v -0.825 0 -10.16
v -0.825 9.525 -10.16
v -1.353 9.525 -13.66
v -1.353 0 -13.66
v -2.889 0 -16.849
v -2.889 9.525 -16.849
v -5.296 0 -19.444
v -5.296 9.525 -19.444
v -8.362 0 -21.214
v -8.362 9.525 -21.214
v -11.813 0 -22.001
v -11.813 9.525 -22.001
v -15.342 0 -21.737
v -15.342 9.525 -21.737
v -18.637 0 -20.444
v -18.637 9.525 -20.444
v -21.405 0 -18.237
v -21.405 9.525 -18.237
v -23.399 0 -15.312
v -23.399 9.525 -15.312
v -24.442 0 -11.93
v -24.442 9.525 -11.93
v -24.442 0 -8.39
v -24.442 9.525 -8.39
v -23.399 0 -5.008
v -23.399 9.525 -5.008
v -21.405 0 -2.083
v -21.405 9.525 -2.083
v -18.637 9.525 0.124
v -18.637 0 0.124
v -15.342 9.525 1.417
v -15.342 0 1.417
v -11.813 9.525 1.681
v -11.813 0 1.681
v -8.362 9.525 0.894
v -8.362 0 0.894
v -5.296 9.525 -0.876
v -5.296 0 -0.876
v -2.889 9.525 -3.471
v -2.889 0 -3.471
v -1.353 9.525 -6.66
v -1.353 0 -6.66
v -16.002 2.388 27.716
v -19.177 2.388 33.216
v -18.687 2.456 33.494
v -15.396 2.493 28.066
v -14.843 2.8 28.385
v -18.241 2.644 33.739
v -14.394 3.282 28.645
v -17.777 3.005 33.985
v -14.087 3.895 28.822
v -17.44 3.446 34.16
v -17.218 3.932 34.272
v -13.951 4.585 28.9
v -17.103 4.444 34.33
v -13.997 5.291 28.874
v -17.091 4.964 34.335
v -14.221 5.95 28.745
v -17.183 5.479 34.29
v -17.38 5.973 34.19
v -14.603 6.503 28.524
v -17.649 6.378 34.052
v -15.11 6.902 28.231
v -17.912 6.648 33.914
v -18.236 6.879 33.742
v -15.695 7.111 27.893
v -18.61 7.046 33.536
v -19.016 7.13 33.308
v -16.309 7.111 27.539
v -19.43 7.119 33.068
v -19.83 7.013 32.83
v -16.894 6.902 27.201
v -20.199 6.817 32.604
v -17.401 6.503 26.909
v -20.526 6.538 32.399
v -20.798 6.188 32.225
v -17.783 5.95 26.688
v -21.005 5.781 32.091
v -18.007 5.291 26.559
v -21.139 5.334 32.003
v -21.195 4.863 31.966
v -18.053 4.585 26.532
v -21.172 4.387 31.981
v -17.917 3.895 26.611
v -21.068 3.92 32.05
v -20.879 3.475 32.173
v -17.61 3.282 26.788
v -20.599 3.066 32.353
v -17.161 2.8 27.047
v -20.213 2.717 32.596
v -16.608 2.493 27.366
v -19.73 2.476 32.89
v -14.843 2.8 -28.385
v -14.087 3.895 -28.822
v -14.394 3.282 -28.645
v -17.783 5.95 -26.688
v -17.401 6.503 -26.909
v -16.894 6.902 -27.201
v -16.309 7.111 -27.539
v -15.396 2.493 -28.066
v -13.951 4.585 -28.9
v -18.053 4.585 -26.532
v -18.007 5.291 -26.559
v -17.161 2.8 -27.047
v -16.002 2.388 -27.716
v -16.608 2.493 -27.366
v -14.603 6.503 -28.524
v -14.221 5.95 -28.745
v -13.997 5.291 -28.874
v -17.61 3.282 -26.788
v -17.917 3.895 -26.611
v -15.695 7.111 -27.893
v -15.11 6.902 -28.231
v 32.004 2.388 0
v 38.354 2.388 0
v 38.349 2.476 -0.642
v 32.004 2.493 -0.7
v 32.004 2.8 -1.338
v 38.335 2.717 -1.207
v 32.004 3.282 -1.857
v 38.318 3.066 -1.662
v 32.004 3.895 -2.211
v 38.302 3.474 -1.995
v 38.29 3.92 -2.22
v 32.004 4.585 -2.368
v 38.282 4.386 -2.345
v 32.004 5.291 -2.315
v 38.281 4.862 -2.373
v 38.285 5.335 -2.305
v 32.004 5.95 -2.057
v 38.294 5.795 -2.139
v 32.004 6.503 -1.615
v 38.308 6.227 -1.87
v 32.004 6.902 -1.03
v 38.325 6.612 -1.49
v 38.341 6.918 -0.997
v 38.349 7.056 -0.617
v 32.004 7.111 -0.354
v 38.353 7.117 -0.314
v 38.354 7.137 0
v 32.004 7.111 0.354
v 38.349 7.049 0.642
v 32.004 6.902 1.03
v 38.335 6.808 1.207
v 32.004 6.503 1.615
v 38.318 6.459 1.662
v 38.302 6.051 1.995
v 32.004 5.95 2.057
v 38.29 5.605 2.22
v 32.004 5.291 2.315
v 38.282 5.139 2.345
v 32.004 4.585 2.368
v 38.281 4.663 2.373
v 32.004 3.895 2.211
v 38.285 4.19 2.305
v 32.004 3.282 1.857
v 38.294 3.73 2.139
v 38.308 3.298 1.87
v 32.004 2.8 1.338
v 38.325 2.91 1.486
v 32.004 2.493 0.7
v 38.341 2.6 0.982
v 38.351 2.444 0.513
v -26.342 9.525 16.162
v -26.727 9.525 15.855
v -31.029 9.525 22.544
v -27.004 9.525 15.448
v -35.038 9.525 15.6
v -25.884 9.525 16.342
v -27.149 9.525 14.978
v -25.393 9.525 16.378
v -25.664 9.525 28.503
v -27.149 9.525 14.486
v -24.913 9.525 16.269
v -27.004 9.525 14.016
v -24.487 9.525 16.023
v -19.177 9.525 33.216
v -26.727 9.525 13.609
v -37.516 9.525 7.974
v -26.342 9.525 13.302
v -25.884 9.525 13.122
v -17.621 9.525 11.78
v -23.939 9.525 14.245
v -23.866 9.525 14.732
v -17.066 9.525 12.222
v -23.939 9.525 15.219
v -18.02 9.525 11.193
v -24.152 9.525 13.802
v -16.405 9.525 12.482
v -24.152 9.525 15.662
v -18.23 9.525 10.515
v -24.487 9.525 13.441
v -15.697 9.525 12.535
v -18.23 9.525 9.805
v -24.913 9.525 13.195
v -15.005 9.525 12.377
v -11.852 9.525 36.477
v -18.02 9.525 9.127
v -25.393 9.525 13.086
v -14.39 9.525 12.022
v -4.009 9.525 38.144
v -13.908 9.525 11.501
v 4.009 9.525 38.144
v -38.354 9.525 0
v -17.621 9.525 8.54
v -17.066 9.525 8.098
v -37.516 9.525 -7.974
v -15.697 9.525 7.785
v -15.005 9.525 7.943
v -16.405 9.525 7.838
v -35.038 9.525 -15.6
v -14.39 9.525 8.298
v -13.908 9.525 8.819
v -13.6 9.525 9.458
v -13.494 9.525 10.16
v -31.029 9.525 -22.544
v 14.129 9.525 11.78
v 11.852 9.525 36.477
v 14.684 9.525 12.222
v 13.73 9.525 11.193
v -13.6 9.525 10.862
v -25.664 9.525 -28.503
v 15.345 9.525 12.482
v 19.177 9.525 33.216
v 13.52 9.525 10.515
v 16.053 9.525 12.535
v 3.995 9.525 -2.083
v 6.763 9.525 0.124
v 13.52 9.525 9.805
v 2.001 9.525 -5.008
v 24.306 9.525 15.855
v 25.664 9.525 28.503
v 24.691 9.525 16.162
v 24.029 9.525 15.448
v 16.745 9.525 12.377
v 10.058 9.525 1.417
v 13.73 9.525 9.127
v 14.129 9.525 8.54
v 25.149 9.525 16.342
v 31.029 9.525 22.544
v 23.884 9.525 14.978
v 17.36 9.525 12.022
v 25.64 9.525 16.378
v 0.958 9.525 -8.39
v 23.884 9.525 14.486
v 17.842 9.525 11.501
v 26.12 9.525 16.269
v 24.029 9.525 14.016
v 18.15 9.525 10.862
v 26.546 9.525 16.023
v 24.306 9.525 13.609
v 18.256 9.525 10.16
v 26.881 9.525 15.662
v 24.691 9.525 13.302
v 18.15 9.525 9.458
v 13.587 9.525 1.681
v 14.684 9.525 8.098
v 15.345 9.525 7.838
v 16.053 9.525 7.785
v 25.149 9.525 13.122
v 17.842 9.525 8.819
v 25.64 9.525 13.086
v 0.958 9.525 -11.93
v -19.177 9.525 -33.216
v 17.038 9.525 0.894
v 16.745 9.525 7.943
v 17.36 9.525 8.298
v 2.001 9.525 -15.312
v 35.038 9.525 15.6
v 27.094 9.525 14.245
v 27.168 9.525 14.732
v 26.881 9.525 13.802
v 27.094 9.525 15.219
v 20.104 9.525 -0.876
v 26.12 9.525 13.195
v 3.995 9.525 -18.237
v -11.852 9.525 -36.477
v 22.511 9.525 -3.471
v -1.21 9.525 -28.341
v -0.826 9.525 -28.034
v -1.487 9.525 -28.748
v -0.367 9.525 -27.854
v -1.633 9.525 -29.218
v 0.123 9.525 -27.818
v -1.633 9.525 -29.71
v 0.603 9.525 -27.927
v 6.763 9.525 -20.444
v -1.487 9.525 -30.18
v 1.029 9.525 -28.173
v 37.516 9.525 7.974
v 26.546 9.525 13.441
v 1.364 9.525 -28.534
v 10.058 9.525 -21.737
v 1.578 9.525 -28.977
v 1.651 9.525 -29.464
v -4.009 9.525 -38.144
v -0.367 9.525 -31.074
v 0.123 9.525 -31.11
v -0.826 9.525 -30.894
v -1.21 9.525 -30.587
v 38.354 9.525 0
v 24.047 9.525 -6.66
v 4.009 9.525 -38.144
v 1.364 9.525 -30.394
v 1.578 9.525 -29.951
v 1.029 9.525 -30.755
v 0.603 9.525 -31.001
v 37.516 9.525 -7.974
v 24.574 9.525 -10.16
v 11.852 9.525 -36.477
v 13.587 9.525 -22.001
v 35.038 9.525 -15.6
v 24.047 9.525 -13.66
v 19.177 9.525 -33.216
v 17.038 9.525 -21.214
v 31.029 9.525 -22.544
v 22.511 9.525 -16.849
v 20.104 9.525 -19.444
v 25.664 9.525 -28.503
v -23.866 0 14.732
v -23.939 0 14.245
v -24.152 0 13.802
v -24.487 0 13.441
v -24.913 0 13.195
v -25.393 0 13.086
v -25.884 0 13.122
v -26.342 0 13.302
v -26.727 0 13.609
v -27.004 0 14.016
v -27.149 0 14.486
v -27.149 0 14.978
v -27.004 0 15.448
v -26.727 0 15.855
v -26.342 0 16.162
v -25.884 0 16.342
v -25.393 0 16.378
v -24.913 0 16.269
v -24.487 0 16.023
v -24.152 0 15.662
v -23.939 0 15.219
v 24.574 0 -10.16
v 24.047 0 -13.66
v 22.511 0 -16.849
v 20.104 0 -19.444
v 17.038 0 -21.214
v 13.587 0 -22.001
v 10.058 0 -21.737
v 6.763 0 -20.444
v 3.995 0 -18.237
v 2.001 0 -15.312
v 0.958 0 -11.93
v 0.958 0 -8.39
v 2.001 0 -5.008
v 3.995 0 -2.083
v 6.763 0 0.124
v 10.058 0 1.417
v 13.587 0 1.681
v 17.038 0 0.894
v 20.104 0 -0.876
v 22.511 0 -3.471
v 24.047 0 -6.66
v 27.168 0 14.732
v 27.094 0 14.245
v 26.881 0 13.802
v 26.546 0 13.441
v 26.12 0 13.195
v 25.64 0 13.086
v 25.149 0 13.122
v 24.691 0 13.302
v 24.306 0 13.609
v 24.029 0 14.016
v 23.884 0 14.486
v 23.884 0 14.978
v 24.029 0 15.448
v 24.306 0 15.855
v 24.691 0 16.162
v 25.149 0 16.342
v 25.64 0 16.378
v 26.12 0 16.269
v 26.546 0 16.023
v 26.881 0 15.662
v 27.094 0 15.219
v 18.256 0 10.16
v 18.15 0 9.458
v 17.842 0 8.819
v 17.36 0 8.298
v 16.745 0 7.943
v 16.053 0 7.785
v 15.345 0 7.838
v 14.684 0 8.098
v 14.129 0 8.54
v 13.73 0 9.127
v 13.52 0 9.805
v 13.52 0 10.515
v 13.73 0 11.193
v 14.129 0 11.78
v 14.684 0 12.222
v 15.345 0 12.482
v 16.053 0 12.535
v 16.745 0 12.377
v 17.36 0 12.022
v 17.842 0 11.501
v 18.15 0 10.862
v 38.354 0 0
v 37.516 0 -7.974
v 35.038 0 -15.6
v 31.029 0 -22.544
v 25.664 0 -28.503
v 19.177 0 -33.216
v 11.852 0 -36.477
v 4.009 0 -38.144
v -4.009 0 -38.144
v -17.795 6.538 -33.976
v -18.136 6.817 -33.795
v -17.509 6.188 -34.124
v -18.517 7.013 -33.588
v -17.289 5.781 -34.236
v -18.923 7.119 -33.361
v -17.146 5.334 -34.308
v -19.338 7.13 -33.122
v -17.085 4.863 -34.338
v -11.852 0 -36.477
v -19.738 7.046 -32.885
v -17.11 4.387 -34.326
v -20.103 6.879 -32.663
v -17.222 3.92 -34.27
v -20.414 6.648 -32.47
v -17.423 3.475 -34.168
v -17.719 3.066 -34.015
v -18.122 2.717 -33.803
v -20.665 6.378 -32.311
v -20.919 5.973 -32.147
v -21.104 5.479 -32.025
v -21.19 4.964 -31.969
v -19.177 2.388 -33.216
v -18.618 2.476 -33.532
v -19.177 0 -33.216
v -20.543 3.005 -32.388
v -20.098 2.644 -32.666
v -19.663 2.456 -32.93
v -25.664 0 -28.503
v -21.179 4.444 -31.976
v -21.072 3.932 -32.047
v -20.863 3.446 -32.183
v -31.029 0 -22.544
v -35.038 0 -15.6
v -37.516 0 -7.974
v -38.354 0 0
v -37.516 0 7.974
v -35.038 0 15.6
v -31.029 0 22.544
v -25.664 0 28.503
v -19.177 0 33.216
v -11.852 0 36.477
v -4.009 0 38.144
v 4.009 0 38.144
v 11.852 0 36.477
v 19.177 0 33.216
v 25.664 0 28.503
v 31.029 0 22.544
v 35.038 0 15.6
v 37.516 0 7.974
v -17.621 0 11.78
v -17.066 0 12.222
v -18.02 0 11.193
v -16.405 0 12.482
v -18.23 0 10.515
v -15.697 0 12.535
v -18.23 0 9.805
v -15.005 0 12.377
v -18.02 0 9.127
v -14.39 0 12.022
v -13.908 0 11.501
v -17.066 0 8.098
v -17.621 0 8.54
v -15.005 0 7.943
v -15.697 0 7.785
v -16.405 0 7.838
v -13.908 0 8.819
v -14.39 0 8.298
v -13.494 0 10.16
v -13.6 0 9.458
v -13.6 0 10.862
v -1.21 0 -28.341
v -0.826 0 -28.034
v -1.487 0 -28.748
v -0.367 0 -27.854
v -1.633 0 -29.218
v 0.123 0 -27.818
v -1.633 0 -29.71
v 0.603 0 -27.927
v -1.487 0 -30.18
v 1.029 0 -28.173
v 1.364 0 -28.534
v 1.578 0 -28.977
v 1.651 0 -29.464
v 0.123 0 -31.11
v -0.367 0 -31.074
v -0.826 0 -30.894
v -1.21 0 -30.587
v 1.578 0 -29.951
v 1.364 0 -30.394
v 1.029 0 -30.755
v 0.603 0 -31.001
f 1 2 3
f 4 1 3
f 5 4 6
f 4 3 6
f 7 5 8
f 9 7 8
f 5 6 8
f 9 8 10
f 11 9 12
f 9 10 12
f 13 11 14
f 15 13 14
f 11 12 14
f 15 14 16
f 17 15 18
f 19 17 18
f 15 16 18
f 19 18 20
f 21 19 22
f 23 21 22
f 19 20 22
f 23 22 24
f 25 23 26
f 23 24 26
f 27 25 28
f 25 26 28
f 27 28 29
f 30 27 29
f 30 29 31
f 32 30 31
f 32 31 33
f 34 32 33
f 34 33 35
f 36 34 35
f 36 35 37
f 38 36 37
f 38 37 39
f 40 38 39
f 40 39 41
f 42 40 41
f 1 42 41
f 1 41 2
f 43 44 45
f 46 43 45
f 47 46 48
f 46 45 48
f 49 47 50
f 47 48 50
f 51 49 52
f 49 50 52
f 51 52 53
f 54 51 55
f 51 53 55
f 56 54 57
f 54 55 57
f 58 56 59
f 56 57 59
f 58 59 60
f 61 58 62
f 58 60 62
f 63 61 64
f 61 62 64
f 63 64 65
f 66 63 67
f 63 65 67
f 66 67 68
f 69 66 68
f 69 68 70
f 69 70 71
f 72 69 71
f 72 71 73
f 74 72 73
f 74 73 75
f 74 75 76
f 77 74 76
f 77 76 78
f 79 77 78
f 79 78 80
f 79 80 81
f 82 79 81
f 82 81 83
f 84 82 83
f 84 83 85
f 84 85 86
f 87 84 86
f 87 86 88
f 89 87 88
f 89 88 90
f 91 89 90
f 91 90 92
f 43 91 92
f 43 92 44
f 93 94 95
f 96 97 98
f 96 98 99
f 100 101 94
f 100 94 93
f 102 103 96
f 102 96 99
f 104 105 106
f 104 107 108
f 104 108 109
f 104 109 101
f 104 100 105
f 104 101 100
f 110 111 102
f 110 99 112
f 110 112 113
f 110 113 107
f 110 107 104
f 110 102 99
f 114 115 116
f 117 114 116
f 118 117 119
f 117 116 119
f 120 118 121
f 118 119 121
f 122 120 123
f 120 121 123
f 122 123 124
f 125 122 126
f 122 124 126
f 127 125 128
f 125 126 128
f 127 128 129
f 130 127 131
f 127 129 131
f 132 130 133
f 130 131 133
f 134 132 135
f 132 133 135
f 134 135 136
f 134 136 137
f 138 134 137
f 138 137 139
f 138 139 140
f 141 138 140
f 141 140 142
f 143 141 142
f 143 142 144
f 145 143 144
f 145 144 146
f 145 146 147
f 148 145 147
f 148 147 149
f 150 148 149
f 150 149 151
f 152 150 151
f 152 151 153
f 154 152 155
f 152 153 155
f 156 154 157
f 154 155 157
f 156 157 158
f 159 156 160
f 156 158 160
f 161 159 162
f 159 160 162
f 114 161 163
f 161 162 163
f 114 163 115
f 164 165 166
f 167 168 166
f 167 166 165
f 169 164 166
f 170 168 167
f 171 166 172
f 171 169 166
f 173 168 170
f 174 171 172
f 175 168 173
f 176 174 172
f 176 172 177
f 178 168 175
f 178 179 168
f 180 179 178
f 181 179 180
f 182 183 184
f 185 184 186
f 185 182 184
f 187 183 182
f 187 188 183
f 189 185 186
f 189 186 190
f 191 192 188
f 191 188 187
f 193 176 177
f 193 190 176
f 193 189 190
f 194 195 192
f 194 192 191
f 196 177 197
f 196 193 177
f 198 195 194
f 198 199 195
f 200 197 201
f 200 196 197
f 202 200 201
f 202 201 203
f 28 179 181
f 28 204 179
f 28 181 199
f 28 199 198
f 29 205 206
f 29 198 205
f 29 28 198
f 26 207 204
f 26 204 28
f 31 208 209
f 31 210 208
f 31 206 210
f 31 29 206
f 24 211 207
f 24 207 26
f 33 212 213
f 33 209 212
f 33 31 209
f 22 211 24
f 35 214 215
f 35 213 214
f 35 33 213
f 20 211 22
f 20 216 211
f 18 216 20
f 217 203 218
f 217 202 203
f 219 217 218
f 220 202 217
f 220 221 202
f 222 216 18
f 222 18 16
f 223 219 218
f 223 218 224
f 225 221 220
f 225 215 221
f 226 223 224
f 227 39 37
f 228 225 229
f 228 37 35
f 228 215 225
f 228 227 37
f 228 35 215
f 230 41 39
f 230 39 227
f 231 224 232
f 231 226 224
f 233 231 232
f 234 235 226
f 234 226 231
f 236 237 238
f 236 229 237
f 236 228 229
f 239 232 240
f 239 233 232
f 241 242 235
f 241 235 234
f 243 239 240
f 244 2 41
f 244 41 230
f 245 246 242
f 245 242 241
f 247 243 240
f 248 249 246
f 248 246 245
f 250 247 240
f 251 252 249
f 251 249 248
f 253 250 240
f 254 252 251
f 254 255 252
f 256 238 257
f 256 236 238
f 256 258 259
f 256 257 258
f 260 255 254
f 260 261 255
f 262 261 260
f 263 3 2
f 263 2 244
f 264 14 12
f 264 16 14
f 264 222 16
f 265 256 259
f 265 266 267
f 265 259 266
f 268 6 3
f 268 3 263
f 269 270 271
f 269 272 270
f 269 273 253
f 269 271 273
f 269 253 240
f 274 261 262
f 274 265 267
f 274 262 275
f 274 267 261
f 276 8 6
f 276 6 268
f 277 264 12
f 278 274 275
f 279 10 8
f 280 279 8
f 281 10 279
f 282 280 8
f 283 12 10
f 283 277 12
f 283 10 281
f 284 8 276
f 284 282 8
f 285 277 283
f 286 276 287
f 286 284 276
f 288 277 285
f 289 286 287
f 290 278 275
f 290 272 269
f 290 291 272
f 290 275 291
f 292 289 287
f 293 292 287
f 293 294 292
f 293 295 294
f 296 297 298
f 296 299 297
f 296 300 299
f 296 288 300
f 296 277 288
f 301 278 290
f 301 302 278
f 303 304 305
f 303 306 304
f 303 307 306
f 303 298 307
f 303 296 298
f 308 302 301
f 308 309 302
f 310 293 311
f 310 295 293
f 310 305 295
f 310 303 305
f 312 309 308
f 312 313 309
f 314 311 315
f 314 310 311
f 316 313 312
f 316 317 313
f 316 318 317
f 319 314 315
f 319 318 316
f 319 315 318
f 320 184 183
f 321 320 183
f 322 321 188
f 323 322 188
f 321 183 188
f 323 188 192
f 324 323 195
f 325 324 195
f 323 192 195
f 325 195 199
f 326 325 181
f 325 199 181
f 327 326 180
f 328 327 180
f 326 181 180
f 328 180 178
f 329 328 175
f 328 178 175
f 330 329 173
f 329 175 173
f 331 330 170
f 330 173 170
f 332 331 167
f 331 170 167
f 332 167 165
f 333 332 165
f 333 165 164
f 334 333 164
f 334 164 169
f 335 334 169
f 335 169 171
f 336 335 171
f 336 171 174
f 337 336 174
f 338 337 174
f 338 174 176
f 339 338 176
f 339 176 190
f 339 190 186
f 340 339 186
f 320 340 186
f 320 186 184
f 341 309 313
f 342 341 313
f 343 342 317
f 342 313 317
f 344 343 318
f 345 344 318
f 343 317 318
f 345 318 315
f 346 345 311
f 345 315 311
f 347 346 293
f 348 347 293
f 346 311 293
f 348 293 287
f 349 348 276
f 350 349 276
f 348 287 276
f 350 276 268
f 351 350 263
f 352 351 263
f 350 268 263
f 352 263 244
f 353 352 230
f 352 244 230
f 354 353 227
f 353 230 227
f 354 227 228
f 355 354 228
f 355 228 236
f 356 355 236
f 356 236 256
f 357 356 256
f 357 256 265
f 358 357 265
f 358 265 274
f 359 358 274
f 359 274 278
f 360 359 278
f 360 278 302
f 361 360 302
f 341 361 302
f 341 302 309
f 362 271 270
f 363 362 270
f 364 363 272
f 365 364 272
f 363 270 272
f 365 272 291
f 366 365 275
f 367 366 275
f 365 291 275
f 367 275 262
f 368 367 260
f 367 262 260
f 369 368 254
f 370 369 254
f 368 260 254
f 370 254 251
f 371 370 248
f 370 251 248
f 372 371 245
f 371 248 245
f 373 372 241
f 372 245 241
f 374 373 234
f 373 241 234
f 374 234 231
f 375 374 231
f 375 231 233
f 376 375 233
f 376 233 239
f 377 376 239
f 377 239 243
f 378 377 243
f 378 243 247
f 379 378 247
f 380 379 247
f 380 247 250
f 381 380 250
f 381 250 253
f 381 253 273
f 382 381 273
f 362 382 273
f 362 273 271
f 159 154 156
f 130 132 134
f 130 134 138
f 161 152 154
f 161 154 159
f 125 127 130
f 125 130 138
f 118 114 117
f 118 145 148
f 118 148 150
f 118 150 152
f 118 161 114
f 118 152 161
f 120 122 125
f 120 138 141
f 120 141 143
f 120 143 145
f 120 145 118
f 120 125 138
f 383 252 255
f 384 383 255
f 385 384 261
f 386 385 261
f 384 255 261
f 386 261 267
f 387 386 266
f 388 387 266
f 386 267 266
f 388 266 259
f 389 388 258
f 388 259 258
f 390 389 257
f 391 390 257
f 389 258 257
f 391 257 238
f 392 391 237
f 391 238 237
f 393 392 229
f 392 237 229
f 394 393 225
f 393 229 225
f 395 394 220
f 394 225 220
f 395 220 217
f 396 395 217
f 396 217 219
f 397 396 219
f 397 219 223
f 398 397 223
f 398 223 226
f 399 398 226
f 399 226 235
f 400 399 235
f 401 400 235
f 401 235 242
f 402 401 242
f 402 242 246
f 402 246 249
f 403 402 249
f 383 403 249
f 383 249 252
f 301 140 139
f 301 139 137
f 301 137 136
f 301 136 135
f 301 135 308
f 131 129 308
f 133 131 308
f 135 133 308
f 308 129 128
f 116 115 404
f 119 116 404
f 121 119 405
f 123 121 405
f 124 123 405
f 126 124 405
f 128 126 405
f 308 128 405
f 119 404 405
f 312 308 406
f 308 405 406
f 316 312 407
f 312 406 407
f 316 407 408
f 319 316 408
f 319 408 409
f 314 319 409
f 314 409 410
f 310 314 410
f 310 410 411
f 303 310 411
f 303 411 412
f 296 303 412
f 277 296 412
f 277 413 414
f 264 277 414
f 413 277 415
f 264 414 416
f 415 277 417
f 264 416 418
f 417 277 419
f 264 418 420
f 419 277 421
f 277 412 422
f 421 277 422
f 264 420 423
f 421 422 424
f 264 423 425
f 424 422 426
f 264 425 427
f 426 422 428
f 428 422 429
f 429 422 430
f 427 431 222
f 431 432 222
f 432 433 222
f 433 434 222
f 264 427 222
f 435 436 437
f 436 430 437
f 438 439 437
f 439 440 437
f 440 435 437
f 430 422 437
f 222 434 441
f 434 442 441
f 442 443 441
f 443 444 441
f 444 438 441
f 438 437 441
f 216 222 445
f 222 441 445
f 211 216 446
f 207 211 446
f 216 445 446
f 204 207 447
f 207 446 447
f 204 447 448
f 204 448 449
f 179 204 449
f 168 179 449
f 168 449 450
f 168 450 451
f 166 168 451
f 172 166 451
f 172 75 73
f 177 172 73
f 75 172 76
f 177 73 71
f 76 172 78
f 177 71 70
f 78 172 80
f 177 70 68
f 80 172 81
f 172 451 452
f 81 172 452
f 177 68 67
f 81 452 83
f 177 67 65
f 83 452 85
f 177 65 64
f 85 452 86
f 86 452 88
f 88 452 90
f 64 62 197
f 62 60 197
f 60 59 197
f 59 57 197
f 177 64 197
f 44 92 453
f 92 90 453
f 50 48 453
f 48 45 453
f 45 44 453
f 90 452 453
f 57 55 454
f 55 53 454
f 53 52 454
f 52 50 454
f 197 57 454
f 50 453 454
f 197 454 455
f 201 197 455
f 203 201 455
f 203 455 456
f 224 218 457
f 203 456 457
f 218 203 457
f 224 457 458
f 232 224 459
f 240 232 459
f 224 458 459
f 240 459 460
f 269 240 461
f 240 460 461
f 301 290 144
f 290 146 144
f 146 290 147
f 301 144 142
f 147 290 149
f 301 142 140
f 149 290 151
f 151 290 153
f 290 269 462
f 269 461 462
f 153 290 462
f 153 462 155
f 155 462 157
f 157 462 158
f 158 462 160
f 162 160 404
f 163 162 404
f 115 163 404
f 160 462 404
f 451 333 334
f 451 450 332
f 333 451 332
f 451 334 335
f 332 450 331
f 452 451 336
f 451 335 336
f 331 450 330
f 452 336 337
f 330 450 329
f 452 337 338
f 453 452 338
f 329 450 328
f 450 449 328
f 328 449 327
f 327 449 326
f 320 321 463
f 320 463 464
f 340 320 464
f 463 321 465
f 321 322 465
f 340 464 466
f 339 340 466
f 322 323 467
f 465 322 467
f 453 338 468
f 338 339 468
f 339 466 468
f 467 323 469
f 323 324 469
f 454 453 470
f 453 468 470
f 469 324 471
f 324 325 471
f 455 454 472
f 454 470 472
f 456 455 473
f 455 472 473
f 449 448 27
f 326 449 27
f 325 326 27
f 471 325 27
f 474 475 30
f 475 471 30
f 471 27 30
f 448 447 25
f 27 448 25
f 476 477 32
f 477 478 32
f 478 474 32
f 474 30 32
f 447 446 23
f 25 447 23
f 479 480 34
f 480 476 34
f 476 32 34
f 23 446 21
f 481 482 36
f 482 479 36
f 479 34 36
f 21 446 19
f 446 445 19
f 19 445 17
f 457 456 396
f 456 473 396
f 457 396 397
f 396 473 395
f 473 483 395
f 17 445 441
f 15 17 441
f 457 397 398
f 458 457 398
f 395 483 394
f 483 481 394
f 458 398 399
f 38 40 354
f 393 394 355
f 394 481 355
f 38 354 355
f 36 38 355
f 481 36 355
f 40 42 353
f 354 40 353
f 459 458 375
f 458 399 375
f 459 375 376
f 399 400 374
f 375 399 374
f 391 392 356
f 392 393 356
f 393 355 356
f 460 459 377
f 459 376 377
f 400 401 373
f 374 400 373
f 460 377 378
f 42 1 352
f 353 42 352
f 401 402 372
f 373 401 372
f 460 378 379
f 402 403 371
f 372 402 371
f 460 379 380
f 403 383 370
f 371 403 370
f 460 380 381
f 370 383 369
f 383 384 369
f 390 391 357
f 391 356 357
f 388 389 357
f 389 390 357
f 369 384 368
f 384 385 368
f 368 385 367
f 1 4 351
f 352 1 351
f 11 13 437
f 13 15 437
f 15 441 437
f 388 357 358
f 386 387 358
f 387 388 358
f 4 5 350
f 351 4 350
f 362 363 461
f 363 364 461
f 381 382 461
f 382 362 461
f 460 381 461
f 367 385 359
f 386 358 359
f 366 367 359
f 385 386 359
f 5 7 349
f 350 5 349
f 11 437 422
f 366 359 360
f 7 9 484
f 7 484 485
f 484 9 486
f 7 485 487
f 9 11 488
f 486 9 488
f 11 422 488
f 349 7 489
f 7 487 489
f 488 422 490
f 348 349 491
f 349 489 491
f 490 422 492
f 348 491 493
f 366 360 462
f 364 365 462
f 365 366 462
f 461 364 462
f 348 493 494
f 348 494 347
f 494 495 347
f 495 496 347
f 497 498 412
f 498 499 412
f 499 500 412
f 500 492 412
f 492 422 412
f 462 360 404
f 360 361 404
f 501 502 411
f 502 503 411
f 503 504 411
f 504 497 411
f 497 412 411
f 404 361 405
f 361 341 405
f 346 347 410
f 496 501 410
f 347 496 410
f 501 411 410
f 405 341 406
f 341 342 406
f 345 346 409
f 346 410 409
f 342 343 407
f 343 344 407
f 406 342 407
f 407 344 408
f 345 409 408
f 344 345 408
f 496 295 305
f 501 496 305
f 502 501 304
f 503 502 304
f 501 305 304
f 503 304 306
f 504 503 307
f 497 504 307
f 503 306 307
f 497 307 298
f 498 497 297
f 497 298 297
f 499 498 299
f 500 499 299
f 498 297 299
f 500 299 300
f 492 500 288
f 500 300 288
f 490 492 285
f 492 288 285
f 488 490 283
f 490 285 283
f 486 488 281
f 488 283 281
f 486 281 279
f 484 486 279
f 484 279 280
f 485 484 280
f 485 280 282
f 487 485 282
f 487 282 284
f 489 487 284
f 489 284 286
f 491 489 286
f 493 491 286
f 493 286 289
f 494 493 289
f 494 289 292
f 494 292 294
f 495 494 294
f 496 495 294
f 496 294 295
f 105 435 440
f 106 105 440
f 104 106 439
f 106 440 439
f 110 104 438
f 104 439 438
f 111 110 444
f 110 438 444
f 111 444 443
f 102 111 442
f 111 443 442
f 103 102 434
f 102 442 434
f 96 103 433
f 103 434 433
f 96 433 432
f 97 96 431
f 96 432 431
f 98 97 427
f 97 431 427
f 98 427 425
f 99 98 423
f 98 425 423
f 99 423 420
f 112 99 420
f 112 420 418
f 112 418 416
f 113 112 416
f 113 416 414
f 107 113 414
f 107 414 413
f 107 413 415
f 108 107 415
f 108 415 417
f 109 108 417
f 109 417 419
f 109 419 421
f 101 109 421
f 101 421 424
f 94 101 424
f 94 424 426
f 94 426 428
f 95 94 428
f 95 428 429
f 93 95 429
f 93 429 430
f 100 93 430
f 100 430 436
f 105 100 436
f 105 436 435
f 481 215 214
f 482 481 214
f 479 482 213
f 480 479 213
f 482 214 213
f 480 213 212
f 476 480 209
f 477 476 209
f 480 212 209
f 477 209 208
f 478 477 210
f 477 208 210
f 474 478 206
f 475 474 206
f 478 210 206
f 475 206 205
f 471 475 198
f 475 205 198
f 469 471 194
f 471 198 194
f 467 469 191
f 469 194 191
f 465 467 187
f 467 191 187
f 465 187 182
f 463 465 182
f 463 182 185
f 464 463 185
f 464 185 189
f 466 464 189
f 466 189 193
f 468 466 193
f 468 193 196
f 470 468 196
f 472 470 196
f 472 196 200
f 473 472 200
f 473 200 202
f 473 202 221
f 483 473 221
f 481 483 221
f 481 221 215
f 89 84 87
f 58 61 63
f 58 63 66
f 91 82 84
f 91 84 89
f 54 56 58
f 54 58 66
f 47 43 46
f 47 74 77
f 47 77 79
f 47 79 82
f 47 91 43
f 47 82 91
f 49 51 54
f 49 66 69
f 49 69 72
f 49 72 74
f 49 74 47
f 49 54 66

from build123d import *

# Parameters (mm, degrees)
SKETCH1_R               = 38.354
BOSS_EXTRUDE1_DEPTH     = 9.525
SKETCH2_R               = 1.651
SKETCH2_R_2             = 11.8745
CUT_EXTRUDE1_DEPTH      = 56.070720506
SKETCH4_R               = 2.3749
CUT_EXTRUDE2_DEPTH      = 6.35
CIRPATTERN1_COUNT       = 3
CUT_EXTRUDE3_DEPTH      = 56.070720662
CUT_EXTRUDE3_DEPTH_BACK = 56.070720662
SKETCH5_R               = 2.38125


with BuildPart() as part:
    # Sketch1 → Boss-Extrude1 (new body)
    with BuildSketch(Plane(origin=(0, 0, 0), x_dir=(1, 0, 0), z_dir=(0, 1, 0))):
        Circle(SKETCH1_R)
    extrude(amount=BOSS_EXTRUDE1_DEPTH)

    # Sketch2 → Cut-Extrude1 (cut, through all)
    with BuildSketch(Plane(origin=(0, 9.525, 0), x_dir=(1, 0, 0), z_dir=(0, 1, 0))):
        with Locations((0, 29.464)):
            Circle(SKETCH2_R)
        with Locations((25.516572497, -14.732)):
            Circle(SKETCH2_R)
        with Locations((-25.516572497, -14.732)):
            Circle(SKETCH2_R)
        with Locations((-12.7, 10.16)):
            Circle(SKETCH2_R_2)
        with Locations((12.7, 10.16)):
            Circle(SKETCH2_R_2)
    extrude(amount=-CUT_EXTRUDE1_DEPTH, mode=Mode.SUBTRACT)

    # Sketch4 → Cut-Extrude2 (cut)
    with BuildSketch(Plane(origin=(-19.177, 0, -33.215538337), x_dir=(0, -1, 0), z_dir=(-0.499999999999998, 0, -0.8660254037844398))):
        with Locations((-4.7625, 0)):
            Circle(SKETCH4_R)
    cut_extrude2 = extrude(amount=-CUT_EXTRUDE2_DEPTH, mode=Mode.SUBTRACT)

    # CirPattern1: Cut-Extrude2 ×3 about axis
    cirpattern1_axis = Axis((0, 10.00125, 0), (0, -1, 0))
    for i in range(1, CIRPATTERN1_COUNT):
        add(cut_extrude2.rotate(cirpattern1_axis, i * 360 / CIRPATTERN1_COUNT), mode=Mode.SUBTRACT)

    # Sketch5 → Cut-Extrude3 (cut, two sides: drawn at the far end of the back side and taken through both)
    with BuildSketch(Plane(origin=(0, 9.525, 0), x_dir=(1, 0, 0), z_dir=(0, 1, 0)).offset(-CUT_EXTRUDE3_DEPTH_BACK)):
        with Locations((-15.875, -10.16)):
            Circle(SKETCH5_R)
        with Locations((15.875, -10.16)):
            Circle(SKETCH5_R)
    extrude(amount=CUT_EXTRUDE3_DEPTH + CUT_EXTRUDE3_DEPTH_BACK, mode=Mode.SUBTRACT)


solid = part.part
